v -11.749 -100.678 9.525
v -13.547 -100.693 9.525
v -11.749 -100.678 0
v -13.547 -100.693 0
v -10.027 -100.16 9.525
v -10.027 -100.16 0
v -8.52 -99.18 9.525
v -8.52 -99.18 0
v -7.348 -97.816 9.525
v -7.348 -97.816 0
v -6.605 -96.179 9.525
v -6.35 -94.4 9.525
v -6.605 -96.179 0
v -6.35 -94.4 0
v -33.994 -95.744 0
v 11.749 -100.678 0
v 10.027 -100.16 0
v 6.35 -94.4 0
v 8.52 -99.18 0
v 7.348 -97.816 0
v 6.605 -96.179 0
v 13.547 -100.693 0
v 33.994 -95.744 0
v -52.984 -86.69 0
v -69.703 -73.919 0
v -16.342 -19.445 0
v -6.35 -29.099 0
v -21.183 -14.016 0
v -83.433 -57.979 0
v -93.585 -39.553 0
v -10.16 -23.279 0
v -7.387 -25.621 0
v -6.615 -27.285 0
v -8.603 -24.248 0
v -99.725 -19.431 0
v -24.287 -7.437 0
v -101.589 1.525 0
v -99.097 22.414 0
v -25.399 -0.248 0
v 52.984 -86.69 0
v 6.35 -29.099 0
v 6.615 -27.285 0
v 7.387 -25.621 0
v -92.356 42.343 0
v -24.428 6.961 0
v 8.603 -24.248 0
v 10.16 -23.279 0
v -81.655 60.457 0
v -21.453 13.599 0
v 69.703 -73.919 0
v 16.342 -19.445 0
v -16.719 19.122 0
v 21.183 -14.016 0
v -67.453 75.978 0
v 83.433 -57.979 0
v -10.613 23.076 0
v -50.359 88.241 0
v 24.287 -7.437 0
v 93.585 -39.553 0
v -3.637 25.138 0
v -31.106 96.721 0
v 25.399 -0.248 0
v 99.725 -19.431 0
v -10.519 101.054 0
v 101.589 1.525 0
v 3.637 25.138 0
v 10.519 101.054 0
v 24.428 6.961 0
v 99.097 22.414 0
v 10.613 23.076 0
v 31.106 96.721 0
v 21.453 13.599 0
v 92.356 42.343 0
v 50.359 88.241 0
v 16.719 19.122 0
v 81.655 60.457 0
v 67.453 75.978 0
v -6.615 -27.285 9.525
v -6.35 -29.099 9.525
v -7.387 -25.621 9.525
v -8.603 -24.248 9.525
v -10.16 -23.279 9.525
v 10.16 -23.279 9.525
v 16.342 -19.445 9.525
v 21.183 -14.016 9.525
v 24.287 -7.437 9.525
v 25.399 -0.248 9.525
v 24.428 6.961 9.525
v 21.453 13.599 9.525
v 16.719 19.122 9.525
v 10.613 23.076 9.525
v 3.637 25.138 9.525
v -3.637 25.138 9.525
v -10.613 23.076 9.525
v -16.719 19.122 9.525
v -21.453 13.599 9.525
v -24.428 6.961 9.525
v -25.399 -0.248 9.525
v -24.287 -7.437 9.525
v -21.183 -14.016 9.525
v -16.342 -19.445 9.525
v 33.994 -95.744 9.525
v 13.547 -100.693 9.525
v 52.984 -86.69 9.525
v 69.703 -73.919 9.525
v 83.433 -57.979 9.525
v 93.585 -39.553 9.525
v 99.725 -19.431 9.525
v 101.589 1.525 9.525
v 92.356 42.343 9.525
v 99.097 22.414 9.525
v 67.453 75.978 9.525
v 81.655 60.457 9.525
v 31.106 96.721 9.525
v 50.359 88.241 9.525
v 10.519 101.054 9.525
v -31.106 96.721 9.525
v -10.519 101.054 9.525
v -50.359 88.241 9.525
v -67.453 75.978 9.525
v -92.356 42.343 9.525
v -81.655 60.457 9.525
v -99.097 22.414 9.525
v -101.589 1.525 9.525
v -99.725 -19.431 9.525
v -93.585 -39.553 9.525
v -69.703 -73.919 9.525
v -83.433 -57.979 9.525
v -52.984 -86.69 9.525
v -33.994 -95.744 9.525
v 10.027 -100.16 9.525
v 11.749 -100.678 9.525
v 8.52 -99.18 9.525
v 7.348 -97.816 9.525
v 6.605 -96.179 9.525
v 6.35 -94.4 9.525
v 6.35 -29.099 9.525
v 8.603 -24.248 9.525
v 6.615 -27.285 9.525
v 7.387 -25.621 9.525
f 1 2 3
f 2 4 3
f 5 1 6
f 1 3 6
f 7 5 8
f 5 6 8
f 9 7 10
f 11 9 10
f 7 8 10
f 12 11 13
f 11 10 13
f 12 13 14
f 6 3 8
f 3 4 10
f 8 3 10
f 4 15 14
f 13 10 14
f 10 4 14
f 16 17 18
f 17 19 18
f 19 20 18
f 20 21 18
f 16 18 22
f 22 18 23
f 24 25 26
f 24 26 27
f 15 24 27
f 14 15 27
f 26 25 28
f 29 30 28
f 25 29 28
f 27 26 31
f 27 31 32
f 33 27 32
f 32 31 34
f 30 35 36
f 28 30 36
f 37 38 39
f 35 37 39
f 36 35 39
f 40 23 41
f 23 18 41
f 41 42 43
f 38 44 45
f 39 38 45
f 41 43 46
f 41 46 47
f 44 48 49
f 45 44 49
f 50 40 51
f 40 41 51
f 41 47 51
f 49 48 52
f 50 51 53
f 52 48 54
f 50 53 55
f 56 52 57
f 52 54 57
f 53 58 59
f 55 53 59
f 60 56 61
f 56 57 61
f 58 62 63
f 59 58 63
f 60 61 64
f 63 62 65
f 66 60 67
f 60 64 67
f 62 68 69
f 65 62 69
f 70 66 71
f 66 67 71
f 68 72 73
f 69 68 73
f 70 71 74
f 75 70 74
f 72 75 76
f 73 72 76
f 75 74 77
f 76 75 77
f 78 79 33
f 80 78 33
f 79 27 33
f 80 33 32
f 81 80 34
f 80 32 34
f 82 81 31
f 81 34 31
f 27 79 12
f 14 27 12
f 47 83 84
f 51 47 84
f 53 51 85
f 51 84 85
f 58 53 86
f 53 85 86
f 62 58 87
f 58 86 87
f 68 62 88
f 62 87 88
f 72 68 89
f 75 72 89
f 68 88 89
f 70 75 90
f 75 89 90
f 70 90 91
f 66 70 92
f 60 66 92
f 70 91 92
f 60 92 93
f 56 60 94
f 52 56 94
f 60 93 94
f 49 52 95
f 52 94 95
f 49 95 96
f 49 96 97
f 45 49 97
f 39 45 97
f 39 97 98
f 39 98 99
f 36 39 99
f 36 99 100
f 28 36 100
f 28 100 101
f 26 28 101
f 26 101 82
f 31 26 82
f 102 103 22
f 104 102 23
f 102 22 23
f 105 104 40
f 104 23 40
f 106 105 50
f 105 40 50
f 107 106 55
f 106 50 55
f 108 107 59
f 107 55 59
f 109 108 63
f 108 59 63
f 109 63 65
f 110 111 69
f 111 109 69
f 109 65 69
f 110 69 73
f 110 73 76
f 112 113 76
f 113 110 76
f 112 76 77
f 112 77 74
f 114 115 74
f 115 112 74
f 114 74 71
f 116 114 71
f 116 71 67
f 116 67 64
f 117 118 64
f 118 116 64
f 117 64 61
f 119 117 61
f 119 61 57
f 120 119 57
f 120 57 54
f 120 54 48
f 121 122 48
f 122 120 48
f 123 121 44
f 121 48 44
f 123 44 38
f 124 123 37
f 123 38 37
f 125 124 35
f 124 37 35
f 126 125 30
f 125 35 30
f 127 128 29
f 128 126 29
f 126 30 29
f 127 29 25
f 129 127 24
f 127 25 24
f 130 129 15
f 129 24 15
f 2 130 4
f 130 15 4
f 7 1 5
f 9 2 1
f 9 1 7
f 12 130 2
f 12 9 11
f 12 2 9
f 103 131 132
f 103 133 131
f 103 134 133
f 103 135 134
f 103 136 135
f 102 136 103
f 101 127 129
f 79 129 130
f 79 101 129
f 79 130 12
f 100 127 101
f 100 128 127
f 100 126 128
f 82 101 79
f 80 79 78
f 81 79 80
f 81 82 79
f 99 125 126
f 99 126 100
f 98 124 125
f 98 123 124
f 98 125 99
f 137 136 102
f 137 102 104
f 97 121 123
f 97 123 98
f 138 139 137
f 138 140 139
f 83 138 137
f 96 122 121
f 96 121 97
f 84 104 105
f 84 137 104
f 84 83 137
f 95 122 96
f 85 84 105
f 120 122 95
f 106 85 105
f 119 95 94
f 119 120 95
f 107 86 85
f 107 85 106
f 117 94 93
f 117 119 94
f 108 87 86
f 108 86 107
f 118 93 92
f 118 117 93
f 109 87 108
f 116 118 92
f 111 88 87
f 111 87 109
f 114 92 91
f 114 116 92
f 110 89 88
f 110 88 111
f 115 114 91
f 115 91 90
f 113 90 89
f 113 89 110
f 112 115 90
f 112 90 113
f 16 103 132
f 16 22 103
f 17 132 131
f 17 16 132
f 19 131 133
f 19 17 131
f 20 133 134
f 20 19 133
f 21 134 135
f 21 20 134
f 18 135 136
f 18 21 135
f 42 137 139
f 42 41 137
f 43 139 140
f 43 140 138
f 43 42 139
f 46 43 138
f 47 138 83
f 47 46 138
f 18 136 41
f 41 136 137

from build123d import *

# Parameters (mm, degrees)
F0_R     = 101.6
F1_DEPTH = 9.525
F3_DEPTH = 9.526
F4_R     = 6.35


with BuildPart() as f1:
    # F0 (on Top) → F1 (new body)
    with BuildSketch(Plane.XY):
        Circle(F0_R)
    extrude(amount=F1_DEPTH)

    # F2 (on face) → F3 (cut, through all)
    with BuildSketch(Plane.XY.offset(9.525)):
        with BuildLine():
            Line((6.35, -101.401368334), (6.35, -24.5934442484))
            ThreePointArc((6.35, -24.5934442484), (0, 25.4), (-6.35, -24.5934442484))
            Line((-6.35, -24.5934442484), (-6.35, -101.401368334))
            ThreePointArc((-6.35, -101.401368334), (0, -101.6), (6.35, -101.401368334))
        make_face()
    extrude(amount=-F3_DEPTH, mode=Mode.SUBTRACT)

    # F4
    f4_edges = [f1.edges().sort_by_distance(p)[0] for p in [
        (-6.35, -101.401368, 4.7625),
        (6.35, -101.401368, 4.7625),
        (-6.35, -24.593444, 4.7625),
        (6.35, -24.593444, 4.7625),
    ]]
    fillet(f4_edges, radius=F4_R)


solid = f1.part
